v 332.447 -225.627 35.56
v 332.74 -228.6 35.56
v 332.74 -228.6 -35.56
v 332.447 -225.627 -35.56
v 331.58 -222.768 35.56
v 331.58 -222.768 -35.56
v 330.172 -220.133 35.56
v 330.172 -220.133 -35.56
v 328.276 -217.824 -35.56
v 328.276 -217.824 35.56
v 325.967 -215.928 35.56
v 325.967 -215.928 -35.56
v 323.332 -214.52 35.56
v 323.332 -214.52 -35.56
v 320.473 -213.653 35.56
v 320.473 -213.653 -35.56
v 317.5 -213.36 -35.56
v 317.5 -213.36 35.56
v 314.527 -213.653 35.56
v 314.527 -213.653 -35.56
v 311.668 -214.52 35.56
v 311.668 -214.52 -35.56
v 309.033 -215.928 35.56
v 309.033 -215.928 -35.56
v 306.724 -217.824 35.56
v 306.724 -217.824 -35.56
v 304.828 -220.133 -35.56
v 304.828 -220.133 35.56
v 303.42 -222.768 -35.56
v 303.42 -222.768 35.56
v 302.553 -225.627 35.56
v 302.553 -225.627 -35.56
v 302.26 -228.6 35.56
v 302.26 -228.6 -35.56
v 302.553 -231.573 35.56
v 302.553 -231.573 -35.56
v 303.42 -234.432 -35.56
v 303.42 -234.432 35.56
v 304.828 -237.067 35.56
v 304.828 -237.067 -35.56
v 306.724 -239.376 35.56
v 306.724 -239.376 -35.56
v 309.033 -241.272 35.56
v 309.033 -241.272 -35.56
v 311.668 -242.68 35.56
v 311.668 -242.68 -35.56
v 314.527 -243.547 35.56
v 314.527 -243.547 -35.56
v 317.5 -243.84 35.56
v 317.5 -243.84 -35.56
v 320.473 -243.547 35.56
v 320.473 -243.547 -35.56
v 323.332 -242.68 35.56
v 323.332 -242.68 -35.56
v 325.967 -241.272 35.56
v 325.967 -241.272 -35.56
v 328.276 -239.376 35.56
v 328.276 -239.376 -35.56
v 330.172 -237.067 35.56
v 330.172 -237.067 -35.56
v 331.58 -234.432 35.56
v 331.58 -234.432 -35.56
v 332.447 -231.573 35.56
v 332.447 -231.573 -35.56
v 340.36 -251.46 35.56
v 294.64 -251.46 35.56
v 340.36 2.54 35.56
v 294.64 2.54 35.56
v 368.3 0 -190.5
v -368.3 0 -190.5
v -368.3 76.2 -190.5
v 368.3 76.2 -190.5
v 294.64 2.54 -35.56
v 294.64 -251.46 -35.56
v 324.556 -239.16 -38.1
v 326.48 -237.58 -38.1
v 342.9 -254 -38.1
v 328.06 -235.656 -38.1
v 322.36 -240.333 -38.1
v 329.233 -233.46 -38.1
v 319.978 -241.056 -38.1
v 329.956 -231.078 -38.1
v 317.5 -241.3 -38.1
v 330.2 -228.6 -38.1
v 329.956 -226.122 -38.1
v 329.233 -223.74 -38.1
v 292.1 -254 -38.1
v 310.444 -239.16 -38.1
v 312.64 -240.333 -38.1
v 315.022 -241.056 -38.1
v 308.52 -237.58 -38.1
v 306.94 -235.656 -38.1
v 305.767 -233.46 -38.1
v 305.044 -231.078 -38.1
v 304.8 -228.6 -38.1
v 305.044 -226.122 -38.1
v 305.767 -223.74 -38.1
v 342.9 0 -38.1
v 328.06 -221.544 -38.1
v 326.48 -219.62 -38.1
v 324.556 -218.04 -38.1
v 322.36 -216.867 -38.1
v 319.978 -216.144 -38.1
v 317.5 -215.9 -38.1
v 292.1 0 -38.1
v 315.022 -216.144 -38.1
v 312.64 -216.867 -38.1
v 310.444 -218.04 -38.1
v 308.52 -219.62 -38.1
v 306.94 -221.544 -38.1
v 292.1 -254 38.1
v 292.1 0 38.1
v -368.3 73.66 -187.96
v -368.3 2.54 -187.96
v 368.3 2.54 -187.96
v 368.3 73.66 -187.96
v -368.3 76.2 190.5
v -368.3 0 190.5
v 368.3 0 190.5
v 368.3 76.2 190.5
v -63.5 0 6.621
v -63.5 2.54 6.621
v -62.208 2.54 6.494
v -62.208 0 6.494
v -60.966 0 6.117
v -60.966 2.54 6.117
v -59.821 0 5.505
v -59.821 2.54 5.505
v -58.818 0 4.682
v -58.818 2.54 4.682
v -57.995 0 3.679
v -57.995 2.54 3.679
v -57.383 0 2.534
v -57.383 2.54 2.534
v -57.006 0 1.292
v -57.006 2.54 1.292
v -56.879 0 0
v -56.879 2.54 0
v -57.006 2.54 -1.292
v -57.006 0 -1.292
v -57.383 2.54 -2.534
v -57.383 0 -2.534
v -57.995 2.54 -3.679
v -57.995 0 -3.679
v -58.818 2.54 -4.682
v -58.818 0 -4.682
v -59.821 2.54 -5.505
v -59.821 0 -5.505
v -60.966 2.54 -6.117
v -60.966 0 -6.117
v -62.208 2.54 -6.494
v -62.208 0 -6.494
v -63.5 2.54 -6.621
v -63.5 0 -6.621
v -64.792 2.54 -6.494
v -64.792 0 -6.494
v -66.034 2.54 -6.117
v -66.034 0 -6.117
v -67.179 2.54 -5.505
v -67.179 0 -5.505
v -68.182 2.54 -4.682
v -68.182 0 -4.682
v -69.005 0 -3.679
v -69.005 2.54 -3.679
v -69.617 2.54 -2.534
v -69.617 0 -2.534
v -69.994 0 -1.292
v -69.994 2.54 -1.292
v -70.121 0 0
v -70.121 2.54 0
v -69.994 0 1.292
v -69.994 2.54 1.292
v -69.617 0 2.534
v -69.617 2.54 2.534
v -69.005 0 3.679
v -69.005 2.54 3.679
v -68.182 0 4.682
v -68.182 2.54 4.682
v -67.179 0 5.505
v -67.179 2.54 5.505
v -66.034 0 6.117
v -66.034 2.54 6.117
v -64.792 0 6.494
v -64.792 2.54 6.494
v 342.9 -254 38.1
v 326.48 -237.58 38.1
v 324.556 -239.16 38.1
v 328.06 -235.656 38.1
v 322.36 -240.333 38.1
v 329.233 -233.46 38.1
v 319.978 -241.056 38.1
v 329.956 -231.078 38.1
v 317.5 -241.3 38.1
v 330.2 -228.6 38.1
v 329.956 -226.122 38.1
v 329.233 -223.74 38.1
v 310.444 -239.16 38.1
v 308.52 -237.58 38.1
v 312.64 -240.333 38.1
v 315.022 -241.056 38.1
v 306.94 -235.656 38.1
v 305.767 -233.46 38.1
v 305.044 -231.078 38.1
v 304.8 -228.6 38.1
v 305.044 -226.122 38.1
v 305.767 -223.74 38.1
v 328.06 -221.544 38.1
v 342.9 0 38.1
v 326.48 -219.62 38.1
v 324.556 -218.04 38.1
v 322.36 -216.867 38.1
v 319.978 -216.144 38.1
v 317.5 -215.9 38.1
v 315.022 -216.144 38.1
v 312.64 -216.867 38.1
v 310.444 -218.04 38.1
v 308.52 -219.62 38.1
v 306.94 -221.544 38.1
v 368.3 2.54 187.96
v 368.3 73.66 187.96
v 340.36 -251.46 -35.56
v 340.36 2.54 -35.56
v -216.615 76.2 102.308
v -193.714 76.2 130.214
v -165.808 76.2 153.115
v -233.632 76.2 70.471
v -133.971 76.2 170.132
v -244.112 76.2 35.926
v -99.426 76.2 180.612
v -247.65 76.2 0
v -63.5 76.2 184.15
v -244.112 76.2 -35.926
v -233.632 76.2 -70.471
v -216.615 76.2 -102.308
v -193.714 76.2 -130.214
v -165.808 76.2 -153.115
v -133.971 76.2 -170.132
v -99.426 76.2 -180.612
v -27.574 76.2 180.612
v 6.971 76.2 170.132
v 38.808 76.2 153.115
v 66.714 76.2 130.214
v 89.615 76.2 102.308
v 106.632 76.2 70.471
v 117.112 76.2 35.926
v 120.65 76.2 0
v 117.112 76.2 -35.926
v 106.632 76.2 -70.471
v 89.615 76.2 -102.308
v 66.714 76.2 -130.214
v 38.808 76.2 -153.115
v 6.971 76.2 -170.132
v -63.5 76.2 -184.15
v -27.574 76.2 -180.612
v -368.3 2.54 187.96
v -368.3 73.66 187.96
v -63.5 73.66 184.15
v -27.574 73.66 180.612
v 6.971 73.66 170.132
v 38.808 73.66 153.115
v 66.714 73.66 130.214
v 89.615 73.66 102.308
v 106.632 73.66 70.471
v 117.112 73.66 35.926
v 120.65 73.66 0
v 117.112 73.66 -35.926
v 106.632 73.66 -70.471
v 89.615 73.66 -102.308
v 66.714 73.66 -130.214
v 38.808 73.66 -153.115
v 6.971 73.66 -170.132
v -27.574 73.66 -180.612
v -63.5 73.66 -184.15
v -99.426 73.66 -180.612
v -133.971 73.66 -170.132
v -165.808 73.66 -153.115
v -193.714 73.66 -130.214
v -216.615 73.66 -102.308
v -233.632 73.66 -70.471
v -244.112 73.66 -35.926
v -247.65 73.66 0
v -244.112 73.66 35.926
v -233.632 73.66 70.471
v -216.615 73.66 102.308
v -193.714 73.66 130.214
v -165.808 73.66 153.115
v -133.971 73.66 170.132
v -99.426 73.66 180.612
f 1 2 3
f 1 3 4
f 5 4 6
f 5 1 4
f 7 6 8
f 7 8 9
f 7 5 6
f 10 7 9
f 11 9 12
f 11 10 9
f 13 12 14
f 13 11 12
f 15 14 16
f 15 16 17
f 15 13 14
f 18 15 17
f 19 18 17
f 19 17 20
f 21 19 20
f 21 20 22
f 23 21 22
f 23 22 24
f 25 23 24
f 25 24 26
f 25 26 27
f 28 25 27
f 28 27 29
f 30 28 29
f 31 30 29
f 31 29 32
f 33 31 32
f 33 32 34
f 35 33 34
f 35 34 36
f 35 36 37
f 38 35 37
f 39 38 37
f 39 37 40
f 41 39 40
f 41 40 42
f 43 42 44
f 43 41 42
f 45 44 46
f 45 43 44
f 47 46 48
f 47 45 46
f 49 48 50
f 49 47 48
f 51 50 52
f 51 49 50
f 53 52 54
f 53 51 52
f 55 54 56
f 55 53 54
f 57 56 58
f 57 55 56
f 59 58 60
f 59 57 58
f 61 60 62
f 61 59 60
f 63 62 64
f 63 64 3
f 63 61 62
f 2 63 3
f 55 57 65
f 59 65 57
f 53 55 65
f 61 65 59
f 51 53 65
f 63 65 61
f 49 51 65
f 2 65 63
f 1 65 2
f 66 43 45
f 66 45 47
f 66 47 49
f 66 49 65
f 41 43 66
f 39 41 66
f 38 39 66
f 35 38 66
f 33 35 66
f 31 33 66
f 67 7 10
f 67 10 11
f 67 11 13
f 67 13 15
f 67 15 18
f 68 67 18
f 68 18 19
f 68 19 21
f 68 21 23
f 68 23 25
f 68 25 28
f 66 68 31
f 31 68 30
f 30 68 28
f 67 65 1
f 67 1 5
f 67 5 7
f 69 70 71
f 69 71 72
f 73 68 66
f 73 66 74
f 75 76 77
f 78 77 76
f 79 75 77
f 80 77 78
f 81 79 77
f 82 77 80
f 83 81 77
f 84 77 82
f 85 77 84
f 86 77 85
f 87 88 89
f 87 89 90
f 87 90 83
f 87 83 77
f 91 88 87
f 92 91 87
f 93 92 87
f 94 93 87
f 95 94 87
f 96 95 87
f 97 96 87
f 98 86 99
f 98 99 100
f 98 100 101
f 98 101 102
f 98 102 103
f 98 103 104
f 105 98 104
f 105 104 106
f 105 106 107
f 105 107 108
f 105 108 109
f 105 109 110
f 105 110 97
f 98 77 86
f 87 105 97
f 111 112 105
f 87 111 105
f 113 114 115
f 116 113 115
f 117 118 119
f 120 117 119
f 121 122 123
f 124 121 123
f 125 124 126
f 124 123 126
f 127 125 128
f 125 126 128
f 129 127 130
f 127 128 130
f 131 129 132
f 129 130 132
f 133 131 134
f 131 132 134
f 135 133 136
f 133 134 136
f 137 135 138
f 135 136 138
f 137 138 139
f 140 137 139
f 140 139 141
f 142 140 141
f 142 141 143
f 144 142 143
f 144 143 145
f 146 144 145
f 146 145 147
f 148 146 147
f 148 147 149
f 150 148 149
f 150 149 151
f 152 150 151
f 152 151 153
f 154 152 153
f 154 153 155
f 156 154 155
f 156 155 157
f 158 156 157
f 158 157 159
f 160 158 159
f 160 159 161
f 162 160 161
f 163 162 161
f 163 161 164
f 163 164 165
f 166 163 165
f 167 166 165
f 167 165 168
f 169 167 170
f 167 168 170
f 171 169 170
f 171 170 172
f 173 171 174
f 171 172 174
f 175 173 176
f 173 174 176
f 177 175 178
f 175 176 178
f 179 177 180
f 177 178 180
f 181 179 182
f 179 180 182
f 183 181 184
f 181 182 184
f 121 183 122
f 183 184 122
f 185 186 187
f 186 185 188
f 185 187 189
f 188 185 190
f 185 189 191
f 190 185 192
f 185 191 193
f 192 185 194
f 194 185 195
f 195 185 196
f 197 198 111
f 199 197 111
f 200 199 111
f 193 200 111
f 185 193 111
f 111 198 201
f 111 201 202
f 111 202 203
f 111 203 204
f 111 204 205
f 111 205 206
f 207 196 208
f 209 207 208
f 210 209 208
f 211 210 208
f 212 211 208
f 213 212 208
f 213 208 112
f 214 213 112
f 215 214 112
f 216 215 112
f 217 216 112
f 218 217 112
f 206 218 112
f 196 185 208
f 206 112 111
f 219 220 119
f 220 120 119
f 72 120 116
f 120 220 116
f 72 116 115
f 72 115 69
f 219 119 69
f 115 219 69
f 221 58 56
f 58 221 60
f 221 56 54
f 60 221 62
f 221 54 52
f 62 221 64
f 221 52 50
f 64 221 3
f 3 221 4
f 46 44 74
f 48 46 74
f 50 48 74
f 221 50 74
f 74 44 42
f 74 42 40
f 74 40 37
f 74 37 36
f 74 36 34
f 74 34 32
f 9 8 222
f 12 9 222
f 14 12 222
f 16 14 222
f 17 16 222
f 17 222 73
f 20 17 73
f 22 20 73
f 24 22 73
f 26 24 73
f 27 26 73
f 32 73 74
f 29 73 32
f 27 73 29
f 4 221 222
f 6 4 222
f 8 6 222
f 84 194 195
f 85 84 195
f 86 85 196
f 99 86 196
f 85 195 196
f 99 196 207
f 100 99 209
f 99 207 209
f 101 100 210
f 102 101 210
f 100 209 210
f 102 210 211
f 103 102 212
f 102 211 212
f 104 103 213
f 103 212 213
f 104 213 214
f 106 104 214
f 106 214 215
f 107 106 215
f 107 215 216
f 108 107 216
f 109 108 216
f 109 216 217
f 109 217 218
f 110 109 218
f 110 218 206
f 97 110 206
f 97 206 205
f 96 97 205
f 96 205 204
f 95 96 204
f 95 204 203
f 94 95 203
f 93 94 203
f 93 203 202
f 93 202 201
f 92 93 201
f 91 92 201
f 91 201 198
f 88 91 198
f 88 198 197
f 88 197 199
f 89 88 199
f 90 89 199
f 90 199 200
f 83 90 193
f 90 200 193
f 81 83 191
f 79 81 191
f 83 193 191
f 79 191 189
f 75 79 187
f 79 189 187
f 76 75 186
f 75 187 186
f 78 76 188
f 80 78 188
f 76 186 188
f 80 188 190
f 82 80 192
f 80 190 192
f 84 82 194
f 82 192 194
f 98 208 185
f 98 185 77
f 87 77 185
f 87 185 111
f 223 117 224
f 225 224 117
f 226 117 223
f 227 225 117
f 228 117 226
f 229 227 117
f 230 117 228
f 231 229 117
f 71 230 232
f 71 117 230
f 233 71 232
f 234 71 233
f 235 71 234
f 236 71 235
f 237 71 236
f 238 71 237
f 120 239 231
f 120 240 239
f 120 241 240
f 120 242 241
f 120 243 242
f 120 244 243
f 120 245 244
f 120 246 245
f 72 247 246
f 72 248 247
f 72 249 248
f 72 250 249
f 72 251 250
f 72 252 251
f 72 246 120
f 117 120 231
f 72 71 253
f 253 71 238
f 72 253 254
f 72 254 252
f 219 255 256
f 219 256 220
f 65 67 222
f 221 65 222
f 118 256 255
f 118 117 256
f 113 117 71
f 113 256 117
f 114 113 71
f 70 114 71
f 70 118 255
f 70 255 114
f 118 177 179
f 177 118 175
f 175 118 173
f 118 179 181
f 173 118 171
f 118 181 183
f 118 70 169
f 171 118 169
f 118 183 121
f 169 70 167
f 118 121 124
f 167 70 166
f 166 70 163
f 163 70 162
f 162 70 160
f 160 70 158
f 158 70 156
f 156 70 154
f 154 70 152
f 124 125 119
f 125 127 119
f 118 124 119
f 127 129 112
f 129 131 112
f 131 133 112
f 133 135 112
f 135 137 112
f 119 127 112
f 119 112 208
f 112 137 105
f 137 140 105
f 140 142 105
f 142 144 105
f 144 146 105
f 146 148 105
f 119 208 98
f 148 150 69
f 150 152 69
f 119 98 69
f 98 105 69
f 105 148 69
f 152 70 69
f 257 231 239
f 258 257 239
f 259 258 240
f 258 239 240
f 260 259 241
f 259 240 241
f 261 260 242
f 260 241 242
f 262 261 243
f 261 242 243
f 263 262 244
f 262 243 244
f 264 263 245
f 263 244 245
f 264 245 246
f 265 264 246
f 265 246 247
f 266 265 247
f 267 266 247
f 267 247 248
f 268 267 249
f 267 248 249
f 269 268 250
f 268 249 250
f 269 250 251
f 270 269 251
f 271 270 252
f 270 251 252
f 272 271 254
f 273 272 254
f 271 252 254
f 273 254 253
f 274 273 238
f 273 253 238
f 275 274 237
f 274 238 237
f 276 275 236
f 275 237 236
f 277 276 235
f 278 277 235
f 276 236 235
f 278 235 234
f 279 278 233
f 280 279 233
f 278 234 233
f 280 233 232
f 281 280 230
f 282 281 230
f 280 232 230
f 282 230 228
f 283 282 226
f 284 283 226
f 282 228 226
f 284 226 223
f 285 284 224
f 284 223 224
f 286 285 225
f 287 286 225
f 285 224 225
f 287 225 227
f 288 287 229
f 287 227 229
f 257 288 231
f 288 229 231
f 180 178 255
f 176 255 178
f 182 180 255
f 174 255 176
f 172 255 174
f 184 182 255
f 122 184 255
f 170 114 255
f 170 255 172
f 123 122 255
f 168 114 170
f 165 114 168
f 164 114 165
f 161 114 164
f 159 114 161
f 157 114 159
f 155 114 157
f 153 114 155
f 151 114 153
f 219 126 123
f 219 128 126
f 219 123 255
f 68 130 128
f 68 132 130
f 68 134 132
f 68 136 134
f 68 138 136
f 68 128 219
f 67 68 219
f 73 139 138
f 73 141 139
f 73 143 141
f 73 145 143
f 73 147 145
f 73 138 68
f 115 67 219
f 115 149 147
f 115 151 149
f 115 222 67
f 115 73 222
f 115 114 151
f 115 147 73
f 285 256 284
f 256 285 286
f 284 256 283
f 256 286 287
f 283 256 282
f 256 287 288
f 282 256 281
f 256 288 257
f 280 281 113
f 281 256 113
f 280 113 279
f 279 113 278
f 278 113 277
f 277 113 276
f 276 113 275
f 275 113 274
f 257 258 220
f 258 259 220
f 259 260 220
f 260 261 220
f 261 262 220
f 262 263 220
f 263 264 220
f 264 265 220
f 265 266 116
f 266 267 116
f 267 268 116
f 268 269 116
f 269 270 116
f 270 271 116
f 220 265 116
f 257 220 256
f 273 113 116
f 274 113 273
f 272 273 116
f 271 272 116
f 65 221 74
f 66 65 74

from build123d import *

# Parameters (mm, degrees)
SKETCH1_W           = 736.6
SKETCH1_H           = 381
BOSS_EXTRUDE1_DEPTH = 76.2
SKETCH2_W           = 50.8
SKETCH2_H           = 76.2
BOSS_EXTRUDE2_DEPTH = 254
SKETCH3_R           = 12.7
CUT_EXTRUDE1_DEPTH  = 503.413027299
SHELL1_T            = -2.54
SKETCH4_R           = 184.15
CUT_EXTRUDE2_DEPTH  = 2.54
SKETCH5_R           = 6.621401099
CUT_EXTRUDE3_DEPTH  = 1219.2


with BuildPart() as part:
    # Sketch1 → Boss-Extrude1 (new body)
    with BuildSketch(Plane(origin=(0, 0, 0), x_dir=(1, 0, 0), z_dir=(0, 1, 0))):
        Rectangle(SKETCH1_W, SKETCH1_H)
    extrude(amount=BOSS_EXTRUDE1_DEPTH)

    # Sketch2 → Boss-Extrude2 (add)
    with BuildSketch(Plane(origin=(0, 0, 0), x_dir=(-1, 0, 0), z_dir=(0, -1, 0))):
        with Locations((-317.5, 0)):
            Rectangle(SKETCH2_W, SKETCH2_H)
    extrude(amount=BOSS_EXTRUDE2_DEPTH)

    # Sketch3 → Cut-Extrude1 (cut, through all)
    with BuildSketch(Plane.XY.offset(38.1)):
        with Locations((317.5, -228.6)):
            Circle(SKETCH3_R)
    extrude(amount=-CUT_EXTRUDE1_DEPTH, mode=Mode.SUBTRACT)

    # Shell1
    shell1_openings = [part.faces().sort_by_distance(p)[0] for p in [
        (-368.3, 38.1, 0),
        (368.3, 38.1, 0),
    ]]
    offset(amount=SHELL1_T, openings=shell1_openings, kind=Kind.INTERSECTION)

    # Sketch4 → Cut-Extrude2 (cut)
    with BuildSketch(Plane(origin=(0, 76.2, 0), x_dir=(1, 0, 0), z_dir=(0, 1, 0))):
        with Locations(Location((-63.5, 0, 0), (0, 0, 270))):
            Circle(SKETCH4_R)
    extrude(amount=-CUT_EXTRUDE2_DEPTH, mode=Mode.SUBTRACT)

    # Sketch5 → Cut-Extrude3 (cut)
    with BuildSketch(Plane(origin=(0, 76.2, 0), x_dir=(1, 0, 0), z_dir=(0, 1, 0))):
        with Locations(Location((-63.5, 0, 0), (0, 0, 270))):
            Circle(SKETCH5_R)
    extrude(amount=-CUT_EXTRUDE3_DEPTH, mode=Mode.SUBTRACT)


solid = part.part
